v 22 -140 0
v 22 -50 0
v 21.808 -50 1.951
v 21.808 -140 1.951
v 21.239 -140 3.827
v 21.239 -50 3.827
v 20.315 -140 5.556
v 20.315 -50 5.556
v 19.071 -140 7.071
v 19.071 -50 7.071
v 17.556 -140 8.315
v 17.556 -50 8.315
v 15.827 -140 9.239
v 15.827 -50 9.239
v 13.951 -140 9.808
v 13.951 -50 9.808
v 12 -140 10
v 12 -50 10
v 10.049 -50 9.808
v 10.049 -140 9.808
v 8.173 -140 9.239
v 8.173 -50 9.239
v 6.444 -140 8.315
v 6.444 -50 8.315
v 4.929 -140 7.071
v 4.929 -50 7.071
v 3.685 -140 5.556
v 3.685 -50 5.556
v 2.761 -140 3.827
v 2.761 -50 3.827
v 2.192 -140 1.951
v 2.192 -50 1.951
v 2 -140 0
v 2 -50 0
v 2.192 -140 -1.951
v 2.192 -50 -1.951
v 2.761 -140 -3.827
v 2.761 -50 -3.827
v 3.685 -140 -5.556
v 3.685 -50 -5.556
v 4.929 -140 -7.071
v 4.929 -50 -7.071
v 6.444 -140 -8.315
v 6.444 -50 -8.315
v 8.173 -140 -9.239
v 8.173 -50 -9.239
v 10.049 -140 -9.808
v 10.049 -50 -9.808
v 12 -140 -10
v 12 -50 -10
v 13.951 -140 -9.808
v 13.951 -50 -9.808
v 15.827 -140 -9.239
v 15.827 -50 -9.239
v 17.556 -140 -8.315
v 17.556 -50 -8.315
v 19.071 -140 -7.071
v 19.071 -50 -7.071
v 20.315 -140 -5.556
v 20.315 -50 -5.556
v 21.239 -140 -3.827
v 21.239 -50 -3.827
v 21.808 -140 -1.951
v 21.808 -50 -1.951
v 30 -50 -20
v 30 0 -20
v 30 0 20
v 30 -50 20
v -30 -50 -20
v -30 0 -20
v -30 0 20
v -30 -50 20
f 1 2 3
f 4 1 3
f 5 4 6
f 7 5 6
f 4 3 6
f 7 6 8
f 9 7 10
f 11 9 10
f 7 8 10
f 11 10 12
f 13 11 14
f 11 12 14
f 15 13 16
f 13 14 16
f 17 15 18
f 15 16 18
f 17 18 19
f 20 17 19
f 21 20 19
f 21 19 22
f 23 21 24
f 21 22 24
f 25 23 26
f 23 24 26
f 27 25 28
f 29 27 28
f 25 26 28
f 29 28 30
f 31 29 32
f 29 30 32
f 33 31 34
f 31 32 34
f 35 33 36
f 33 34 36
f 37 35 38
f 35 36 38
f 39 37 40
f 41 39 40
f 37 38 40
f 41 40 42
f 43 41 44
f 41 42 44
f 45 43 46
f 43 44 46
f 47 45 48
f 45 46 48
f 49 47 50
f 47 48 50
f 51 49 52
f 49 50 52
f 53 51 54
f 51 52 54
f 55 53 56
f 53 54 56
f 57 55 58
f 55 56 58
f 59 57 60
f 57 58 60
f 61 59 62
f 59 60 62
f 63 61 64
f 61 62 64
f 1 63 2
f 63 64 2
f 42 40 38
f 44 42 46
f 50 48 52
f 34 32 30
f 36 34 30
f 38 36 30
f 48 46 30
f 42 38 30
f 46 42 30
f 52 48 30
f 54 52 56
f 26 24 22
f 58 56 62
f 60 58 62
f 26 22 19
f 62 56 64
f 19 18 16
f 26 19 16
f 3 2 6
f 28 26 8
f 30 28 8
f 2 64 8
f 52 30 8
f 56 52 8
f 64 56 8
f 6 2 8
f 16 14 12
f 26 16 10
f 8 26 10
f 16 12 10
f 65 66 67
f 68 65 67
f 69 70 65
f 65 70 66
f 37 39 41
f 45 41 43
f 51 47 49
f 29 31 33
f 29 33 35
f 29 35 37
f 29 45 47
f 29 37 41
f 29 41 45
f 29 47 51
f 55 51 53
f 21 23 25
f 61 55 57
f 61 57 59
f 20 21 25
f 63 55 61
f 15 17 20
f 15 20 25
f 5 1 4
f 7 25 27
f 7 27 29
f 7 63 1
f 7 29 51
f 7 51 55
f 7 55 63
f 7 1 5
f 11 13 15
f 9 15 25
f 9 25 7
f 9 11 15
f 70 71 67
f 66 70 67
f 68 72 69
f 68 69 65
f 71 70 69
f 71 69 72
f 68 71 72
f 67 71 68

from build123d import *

# Parameters (mm, degrees)
F0_W     = 60
F0_H     = 40
F1_DEPTH = 50
F2_R     = 10
F3_DEPTH = 90


with BuildPart() as f1:
    # F0 (on Front) → F1 (new body)
    with BuildSketch(Plane.XZ):
        Rectangle(F0_W, F0_H)
    extrude(amount=F1_DEPTH)


with BuildPart() as f3:
    # F2 (on face) → F3 (new body)
    with BuildSketch(Plane.XZ.offset(50)):
        with Locations((12, 0)):
            Circle(F2_R)
    extrude(amount=F3_DEPTH)


solid = Compound([f1.part, f3.part])
